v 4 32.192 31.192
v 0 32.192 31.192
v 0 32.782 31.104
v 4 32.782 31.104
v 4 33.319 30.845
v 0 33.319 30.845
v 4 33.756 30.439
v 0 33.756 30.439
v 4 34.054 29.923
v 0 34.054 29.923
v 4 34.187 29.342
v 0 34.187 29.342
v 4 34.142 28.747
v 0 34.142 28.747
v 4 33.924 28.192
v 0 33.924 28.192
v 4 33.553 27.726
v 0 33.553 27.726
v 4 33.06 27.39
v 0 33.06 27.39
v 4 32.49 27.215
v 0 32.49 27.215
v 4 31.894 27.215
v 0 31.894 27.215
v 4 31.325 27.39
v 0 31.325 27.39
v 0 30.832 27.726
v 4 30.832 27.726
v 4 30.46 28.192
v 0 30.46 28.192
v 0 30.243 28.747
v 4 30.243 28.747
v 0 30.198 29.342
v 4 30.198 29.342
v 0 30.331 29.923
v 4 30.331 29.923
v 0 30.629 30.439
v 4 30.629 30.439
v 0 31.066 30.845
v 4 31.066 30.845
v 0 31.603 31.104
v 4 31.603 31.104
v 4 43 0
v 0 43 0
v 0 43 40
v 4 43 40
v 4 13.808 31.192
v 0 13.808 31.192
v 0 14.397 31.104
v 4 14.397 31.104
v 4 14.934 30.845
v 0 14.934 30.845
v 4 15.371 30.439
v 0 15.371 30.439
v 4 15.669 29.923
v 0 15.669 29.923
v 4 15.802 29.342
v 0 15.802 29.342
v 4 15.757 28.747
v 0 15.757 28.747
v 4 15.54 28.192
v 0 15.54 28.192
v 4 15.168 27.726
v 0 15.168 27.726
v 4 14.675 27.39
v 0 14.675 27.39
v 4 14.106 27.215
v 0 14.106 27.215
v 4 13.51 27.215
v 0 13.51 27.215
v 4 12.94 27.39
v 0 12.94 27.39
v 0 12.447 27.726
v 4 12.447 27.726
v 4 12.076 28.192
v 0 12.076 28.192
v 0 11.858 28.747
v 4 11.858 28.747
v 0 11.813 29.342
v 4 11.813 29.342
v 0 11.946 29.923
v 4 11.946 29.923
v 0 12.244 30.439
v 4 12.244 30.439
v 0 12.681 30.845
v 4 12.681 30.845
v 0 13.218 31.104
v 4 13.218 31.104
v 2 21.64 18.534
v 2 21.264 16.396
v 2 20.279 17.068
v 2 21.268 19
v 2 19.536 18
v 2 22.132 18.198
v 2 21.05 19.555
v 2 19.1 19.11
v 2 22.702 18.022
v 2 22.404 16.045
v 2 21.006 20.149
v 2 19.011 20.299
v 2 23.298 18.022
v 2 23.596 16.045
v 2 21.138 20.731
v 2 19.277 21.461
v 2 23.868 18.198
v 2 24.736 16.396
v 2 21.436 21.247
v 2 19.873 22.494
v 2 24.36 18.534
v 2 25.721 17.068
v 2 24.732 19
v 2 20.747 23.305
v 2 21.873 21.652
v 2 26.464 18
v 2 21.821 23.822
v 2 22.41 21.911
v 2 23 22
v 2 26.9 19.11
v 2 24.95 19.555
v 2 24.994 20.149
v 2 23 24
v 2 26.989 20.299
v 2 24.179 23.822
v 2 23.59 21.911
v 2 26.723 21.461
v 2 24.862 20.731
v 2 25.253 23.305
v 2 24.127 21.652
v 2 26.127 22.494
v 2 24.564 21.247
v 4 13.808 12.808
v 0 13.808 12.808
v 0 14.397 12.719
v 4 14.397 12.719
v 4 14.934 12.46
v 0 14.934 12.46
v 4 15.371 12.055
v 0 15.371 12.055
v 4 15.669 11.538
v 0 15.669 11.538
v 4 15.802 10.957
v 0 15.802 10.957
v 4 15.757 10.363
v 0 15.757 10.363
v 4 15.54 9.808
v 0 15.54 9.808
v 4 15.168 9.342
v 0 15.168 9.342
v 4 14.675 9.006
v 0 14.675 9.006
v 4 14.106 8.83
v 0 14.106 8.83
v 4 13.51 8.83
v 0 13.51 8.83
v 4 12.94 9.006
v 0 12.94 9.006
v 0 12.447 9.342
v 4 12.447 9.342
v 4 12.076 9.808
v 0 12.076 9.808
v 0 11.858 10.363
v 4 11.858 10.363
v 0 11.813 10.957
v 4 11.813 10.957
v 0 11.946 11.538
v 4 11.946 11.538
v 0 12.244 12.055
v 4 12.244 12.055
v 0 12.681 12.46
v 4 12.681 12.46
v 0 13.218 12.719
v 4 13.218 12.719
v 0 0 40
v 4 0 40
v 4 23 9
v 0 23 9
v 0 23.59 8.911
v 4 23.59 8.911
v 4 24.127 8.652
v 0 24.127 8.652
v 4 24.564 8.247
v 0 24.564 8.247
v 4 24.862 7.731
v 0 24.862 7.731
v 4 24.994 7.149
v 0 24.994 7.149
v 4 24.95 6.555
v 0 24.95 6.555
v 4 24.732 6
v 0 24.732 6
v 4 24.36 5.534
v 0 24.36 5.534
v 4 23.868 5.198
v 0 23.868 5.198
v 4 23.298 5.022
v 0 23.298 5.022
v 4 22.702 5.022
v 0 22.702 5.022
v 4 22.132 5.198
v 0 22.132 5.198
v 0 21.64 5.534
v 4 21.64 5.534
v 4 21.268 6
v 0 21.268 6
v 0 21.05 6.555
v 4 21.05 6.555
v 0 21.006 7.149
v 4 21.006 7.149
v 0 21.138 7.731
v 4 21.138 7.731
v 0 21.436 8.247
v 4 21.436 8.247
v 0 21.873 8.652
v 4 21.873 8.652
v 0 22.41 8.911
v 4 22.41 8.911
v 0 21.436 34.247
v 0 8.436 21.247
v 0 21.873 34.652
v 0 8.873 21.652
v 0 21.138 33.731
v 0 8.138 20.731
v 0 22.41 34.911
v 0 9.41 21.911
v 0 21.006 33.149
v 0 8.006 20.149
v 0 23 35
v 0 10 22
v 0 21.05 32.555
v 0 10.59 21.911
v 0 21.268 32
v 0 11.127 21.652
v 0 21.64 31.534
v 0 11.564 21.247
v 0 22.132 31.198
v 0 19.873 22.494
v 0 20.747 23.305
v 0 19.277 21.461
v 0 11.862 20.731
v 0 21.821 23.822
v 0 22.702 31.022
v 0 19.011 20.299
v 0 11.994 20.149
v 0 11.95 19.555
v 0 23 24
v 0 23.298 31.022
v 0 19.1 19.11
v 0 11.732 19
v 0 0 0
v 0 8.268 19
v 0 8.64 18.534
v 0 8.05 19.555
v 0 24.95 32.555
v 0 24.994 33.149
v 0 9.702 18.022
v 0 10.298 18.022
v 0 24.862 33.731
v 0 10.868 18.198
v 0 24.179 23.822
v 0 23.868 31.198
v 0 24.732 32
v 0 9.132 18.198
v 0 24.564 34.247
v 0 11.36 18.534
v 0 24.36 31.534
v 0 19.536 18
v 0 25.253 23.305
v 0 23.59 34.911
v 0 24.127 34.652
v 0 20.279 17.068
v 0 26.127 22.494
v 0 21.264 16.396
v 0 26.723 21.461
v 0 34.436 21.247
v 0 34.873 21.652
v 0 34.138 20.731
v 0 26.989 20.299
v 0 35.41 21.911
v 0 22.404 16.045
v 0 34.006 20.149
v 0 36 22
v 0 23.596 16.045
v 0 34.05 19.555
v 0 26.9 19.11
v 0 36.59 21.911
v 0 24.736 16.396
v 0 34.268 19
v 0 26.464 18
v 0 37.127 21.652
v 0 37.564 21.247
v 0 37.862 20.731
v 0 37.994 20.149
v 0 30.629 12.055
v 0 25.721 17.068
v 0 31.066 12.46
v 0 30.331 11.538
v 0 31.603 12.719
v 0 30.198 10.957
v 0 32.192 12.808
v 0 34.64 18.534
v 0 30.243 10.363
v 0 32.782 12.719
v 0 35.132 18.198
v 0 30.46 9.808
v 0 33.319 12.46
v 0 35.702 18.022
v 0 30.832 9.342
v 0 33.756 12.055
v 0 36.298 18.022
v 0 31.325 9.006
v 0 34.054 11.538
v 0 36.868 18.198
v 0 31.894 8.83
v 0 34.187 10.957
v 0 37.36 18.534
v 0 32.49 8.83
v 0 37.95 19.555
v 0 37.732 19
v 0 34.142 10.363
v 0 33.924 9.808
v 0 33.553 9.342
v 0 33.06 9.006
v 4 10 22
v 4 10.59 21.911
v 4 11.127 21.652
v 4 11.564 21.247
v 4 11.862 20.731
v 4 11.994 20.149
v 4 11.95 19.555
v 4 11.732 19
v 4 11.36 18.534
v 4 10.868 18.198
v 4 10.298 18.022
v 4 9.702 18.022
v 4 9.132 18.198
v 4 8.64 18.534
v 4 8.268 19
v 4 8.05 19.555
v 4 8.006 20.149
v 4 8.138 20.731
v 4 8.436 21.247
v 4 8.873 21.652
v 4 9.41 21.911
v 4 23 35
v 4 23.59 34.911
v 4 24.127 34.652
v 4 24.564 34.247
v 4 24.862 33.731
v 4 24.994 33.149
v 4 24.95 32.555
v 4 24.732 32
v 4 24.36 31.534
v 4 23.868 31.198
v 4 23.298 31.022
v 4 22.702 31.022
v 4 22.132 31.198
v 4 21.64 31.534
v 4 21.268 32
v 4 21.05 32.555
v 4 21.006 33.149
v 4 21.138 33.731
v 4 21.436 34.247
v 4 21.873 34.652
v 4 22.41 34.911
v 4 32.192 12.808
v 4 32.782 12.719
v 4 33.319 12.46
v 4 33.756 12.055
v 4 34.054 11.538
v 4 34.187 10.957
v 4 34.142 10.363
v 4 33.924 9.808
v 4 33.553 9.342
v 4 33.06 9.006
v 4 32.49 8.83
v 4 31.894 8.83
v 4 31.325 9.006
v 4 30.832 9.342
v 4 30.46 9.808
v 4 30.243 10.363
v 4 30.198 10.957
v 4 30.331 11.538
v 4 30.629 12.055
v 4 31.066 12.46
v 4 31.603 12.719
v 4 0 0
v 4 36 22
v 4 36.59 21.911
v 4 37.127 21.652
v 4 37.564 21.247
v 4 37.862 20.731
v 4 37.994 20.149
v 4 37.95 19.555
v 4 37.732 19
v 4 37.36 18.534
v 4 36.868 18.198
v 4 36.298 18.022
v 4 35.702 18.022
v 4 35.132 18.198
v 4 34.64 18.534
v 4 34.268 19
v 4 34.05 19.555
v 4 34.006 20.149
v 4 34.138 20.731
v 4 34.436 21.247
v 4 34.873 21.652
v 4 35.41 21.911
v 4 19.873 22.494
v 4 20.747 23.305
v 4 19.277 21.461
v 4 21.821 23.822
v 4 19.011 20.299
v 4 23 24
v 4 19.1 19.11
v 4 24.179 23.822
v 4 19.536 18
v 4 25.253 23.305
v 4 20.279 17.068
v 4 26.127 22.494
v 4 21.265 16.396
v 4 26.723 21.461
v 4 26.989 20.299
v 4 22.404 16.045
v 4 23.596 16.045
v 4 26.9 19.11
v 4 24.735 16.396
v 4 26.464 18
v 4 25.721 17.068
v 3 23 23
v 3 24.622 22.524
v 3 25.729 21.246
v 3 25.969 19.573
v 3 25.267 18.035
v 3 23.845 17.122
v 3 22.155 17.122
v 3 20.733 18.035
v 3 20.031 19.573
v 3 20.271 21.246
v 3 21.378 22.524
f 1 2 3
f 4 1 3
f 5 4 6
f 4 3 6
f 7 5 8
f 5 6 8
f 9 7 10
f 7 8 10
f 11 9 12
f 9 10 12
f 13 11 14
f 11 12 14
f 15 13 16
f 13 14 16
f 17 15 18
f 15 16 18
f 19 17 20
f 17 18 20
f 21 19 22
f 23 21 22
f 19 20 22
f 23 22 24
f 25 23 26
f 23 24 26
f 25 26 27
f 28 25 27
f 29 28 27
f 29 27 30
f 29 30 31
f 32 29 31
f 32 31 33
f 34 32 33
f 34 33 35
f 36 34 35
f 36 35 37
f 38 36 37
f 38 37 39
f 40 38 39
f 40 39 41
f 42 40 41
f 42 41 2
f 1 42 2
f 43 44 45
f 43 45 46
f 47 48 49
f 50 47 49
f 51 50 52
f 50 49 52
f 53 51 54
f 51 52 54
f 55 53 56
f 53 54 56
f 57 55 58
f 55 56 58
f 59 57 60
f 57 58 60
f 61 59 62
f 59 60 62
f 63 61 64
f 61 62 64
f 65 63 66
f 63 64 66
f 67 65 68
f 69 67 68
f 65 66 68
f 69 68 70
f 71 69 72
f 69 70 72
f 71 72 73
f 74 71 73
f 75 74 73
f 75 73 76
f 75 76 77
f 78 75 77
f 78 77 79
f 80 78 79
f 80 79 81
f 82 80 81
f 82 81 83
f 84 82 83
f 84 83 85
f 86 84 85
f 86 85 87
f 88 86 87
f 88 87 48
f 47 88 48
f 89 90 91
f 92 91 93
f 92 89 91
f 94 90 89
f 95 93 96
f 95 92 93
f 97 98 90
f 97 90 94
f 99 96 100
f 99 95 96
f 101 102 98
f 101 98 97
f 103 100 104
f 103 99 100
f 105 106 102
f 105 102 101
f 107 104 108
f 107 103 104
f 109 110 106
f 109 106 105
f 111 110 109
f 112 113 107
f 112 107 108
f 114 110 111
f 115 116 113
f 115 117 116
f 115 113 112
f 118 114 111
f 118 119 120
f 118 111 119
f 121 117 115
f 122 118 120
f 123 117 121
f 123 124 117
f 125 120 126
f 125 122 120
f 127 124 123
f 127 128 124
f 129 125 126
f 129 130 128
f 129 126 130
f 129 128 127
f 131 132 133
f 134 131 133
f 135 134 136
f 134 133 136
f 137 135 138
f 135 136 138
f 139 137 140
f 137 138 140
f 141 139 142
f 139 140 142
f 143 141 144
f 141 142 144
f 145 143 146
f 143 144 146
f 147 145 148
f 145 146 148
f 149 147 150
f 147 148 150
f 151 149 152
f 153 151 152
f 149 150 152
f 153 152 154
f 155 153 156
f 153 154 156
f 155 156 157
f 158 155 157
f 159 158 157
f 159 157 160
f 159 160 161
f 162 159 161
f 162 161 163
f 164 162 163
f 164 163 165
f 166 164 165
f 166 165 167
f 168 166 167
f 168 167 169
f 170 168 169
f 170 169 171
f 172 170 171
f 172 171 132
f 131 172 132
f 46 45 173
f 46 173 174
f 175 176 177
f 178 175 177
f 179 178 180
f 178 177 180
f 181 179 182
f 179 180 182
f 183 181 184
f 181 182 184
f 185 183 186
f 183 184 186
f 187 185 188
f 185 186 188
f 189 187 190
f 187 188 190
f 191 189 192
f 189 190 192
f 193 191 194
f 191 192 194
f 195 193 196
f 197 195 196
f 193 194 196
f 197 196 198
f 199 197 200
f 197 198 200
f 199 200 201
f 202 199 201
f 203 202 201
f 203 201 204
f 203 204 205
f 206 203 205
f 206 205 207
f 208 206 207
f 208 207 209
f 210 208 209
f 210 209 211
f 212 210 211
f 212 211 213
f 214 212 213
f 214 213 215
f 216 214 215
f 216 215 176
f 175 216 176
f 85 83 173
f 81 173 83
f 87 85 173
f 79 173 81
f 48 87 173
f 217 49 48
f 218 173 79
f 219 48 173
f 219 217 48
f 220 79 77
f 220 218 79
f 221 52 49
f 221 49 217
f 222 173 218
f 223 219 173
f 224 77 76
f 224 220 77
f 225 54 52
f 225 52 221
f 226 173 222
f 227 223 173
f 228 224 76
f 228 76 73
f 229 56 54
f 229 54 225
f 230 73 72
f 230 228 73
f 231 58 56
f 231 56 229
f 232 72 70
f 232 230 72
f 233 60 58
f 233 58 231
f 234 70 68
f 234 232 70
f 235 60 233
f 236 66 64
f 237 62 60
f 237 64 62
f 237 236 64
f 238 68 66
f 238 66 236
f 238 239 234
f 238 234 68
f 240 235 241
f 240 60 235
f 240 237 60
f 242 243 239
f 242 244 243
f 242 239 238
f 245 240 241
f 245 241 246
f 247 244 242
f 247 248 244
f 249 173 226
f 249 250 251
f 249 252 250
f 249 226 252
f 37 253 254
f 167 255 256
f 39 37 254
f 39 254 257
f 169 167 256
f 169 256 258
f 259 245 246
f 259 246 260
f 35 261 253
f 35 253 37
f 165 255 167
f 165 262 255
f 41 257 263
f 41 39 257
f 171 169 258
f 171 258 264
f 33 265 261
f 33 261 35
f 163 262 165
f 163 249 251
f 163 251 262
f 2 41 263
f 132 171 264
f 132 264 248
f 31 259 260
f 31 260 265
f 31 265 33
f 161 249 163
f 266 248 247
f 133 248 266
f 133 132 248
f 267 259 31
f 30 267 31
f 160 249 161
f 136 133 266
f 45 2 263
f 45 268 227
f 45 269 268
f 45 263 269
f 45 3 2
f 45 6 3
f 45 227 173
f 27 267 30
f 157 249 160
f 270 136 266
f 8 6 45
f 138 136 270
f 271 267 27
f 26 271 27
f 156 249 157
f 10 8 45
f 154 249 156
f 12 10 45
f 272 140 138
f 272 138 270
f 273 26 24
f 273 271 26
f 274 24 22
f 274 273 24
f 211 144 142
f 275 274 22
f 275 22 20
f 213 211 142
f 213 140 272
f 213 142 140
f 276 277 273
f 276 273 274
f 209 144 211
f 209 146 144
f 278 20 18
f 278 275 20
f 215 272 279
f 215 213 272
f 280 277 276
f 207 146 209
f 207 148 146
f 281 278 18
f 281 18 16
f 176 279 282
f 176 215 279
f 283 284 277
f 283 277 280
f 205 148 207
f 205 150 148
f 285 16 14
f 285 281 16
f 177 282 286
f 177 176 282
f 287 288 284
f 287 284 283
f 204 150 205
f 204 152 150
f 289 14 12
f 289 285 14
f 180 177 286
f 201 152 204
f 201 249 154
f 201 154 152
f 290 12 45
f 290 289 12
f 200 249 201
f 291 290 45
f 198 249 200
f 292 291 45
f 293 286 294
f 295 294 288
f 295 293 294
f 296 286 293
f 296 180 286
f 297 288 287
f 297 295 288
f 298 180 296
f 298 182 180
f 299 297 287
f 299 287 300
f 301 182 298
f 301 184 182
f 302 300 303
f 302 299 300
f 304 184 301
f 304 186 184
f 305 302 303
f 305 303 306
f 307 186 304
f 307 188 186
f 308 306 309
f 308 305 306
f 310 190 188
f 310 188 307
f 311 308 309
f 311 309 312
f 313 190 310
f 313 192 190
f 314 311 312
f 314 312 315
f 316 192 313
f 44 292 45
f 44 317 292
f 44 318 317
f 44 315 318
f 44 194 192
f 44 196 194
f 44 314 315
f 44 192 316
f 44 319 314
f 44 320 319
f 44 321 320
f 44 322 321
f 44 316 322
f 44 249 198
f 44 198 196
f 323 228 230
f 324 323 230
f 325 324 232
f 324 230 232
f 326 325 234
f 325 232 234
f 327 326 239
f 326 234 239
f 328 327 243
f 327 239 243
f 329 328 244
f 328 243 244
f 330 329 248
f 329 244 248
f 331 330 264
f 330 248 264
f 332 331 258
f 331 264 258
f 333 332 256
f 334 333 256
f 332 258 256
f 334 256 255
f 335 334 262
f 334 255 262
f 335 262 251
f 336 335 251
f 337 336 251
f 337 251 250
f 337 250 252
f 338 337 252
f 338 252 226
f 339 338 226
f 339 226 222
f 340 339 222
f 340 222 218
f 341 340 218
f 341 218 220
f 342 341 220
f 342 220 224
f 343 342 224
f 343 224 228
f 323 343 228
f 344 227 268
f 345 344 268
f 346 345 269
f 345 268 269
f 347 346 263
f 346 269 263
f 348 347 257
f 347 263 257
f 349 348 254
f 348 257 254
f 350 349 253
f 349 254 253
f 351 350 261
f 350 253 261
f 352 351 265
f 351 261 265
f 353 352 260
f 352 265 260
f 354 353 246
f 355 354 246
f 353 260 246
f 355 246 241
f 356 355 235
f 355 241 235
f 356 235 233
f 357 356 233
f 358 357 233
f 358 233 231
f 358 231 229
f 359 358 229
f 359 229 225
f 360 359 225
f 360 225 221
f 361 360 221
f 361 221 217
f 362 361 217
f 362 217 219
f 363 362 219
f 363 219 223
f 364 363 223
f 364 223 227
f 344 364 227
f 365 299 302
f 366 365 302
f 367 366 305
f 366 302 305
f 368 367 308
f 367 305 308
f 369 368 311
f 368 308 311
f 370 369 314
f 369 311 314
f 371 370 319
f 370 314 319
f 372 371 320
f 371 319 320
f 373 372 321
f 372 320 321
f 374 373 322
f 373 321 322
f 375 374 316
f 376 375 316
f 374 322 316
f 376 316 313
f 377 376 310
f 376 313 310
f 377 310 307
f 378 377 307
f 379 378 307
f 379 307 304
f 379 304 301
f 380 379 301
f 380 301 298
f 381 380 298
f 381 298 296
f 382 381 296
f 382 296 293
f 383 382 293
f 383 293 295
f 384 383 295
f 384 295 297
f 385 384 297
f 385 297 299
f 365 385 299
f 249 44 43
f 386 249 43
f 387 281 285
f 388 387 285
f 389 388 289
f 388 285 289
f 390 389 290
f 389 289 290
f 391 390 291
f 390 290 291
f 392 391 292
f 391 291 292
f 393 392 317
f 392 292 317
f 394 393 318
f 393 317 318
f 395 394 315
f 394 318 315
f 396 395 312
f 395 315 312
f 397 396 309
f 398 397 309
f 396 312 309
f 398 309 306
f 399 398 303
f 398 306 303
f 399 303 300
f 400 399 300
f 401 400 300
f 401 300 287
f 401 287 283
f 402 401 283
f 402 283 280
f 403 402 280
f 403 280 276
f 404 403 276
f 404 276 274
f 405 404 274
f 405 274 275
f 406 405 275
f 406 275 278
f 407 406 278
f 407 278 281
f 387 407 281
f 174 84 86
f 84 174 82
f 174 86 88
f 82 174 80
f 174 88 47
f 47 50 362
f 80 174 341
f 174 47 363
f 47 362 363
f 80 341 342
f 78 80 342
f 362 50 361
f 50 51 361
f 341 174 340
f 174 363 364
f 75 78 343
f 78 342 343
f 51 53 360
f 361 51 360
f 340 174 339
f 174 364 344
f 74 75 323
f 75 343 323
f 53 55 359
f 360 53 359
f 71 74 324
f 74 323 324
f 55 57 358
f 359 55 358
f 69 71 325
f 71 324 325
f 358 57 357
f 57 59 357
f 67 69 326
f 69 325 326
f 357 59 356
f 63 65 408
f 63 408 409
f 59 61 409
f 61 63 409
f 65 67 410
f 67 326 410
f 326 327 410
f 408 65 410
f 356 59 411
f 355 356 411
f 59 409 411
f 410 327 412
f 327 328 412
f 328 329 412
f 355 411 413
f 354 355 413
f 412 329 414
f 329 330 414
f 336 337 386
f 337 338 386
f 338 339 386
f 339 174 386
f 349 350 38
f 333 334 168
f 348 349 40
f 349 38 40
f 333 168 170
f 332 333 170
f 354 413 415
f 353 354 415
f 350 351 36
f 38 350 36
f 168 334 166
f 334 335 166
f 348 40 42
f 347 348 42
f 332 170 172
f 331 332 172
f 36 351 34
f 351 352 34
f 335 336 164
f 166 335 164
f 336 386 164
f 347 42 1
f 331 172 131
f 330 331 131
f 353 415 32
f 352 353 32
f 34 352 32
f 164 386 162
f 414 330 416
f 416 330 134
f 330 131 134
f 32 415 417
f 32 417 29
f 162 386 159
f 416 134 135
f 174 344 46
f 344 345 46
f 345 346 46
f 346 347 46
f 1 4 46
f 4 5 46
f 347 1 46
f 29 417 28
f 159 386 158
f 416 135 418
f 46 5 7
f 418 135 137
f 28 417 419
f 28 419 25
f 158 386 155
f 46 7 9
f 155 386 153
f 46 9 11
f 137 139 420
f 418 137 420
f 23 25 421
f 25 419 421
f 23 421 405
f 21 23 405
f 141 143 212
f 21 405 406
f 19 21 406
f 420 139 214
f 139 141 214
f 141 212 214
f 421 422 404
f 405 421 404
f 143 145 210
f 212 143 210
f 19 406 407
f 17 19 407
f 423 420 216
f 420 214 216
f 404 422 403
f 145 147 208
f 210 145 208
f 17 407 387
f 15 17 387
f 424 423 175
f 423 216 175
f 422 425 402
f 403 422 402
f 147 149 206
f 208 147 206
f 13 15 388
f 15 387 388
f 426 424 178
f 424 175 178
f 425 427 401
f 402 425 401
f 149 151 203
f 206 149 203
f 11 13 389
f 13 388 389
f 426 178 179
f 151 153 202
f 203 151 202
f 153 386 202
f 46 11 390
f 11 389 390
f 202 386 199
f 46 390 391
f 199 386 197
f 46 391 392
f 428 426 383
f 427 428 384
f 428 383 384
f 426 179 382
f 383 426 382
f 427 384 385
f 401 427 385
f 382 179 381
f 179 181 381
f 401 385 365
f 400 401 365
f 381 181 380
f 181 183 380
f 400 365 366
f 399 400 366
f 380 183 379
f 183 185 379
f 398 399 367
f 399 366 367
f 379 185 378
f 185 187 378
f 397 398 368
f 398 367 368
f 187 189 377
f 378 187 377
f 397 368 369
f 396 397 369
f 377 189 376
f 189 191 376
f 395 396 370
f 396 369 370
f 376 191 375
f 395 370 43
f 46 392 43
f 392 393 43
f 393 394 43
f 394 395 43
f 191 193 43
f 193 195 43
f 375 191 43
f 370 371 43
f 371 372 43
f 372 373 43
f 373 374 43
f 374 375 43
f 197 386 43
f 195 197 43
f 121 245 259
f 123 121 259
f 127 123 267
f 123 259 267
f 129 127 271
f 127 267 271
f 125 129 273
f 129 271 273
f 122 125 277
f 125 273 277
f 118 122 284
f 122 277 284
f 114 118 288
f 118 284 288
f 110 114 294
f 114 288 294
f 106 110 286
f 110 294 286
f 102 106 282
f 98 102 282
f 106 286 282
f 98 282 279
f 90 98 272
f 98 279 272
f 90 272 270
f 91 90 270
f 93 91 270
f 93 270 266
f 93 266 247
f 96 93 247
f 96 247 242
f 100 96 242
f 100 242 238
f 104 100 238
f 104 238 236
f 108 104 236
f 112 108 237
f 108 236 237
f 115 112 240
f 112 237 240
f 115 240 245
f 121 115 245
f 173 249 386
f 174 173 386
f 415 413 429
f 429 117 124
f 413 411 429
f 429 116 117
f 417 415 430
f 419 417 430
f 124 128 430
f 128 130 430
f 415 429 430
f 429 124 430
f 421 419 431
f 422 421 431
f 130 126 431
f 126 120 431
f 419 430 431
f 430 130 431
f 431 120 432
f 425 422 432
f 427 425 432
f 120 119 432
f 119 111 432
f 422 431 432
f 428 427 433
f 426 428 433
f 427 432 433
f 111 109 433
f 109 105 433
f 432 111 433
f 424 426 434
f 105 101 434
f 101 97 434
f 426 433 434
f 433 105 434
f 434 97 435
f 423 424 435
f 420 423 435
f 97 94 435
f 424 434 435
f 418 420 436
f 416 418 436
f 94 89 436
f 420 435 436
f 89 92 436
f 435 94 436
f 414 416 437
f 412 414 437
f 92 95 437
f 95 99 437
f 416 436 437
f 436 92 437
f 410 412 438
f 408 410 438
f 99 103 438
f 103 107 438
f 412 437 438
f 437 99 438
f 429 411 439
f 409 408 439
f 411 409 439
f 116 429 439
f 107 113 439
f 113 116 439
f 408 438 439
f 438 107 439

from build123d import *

# Parameters (mm, degrees)
ESQUISSE1_W      = 4
ESQUISSE1_H      = 43
EXTRUSION1_DEPTH = 40
ESQUISSE2_R      = 2
EXTRUSION2_DEPTH = 59.864250611
ESQUISSE3_R      = 4
EXTRUSION3_DEPTH = 2
CHANFREIN1_SIZE  = 2


with BuildPart() as part:
    # Esquisse1 → Extrusion1 (new body)
    with BuildSketch(Plane.XY):
        with Locations((2, 21.5)):
            Rectangle(ESQUISSE1_W, ESQUISSE1_H)
    extrude(amount=EXTRUSION1_DEPTH)

    # Esquisse2 → Extrusion2 (cut, through all)
    with BuildSketch(Plane.ZY):
        with Locations((29.192388155, 32.192388155)):
            Circle(ESQUISSE2_R)
        with Locations((20, 23)):
            Circle(ESQUISSE2_R)
        with Locations((20, 36)):
            Circle(ESQUISSE2_R)
        with Locations((33, 23)):
            Circle(ESQUISSE2_R)
        with Locations((29.192388155, 13.807611845)):
            Circle(ESQUISSE2_R)
        with Locations((20, 10)):
            Circle(ESQUISSE2_R)
        with Locations((10.807611845, 13.807611845)):
            Circle(ESQUISSE2_R)
        with Locations((7, 23)):
            Circle(ESQUISSE2_R)
        with Locations((10.807611845, 32.192388155)):
            Circle(ESQUISSE2_R)
    extrude(amount=-EXTRUSION2_DEPTH, mode=Mode.SUBTRACT)

    # Esquisse3 → Extrusion3 (cut)
    with BuildSketch(Plane.ZY):
        with Locations((20, 23)):
            Circle(ESQUISSE3_R)
    extrude(amount=-EXTRUSION3_DEPTH, mode=Mode.SUBTRACT)

    # Chanfrein1
    chanfrein1_edges = [part.edges().sort_by_distance(p)[0] for p in [
        (4, 23, 18),
    ]]
    chamfer(chanfrein1_edges, length=CHANFREIN1_SIZE - 0.0001)  # a hair under: the kernel refuses the full size


solid = part.part
